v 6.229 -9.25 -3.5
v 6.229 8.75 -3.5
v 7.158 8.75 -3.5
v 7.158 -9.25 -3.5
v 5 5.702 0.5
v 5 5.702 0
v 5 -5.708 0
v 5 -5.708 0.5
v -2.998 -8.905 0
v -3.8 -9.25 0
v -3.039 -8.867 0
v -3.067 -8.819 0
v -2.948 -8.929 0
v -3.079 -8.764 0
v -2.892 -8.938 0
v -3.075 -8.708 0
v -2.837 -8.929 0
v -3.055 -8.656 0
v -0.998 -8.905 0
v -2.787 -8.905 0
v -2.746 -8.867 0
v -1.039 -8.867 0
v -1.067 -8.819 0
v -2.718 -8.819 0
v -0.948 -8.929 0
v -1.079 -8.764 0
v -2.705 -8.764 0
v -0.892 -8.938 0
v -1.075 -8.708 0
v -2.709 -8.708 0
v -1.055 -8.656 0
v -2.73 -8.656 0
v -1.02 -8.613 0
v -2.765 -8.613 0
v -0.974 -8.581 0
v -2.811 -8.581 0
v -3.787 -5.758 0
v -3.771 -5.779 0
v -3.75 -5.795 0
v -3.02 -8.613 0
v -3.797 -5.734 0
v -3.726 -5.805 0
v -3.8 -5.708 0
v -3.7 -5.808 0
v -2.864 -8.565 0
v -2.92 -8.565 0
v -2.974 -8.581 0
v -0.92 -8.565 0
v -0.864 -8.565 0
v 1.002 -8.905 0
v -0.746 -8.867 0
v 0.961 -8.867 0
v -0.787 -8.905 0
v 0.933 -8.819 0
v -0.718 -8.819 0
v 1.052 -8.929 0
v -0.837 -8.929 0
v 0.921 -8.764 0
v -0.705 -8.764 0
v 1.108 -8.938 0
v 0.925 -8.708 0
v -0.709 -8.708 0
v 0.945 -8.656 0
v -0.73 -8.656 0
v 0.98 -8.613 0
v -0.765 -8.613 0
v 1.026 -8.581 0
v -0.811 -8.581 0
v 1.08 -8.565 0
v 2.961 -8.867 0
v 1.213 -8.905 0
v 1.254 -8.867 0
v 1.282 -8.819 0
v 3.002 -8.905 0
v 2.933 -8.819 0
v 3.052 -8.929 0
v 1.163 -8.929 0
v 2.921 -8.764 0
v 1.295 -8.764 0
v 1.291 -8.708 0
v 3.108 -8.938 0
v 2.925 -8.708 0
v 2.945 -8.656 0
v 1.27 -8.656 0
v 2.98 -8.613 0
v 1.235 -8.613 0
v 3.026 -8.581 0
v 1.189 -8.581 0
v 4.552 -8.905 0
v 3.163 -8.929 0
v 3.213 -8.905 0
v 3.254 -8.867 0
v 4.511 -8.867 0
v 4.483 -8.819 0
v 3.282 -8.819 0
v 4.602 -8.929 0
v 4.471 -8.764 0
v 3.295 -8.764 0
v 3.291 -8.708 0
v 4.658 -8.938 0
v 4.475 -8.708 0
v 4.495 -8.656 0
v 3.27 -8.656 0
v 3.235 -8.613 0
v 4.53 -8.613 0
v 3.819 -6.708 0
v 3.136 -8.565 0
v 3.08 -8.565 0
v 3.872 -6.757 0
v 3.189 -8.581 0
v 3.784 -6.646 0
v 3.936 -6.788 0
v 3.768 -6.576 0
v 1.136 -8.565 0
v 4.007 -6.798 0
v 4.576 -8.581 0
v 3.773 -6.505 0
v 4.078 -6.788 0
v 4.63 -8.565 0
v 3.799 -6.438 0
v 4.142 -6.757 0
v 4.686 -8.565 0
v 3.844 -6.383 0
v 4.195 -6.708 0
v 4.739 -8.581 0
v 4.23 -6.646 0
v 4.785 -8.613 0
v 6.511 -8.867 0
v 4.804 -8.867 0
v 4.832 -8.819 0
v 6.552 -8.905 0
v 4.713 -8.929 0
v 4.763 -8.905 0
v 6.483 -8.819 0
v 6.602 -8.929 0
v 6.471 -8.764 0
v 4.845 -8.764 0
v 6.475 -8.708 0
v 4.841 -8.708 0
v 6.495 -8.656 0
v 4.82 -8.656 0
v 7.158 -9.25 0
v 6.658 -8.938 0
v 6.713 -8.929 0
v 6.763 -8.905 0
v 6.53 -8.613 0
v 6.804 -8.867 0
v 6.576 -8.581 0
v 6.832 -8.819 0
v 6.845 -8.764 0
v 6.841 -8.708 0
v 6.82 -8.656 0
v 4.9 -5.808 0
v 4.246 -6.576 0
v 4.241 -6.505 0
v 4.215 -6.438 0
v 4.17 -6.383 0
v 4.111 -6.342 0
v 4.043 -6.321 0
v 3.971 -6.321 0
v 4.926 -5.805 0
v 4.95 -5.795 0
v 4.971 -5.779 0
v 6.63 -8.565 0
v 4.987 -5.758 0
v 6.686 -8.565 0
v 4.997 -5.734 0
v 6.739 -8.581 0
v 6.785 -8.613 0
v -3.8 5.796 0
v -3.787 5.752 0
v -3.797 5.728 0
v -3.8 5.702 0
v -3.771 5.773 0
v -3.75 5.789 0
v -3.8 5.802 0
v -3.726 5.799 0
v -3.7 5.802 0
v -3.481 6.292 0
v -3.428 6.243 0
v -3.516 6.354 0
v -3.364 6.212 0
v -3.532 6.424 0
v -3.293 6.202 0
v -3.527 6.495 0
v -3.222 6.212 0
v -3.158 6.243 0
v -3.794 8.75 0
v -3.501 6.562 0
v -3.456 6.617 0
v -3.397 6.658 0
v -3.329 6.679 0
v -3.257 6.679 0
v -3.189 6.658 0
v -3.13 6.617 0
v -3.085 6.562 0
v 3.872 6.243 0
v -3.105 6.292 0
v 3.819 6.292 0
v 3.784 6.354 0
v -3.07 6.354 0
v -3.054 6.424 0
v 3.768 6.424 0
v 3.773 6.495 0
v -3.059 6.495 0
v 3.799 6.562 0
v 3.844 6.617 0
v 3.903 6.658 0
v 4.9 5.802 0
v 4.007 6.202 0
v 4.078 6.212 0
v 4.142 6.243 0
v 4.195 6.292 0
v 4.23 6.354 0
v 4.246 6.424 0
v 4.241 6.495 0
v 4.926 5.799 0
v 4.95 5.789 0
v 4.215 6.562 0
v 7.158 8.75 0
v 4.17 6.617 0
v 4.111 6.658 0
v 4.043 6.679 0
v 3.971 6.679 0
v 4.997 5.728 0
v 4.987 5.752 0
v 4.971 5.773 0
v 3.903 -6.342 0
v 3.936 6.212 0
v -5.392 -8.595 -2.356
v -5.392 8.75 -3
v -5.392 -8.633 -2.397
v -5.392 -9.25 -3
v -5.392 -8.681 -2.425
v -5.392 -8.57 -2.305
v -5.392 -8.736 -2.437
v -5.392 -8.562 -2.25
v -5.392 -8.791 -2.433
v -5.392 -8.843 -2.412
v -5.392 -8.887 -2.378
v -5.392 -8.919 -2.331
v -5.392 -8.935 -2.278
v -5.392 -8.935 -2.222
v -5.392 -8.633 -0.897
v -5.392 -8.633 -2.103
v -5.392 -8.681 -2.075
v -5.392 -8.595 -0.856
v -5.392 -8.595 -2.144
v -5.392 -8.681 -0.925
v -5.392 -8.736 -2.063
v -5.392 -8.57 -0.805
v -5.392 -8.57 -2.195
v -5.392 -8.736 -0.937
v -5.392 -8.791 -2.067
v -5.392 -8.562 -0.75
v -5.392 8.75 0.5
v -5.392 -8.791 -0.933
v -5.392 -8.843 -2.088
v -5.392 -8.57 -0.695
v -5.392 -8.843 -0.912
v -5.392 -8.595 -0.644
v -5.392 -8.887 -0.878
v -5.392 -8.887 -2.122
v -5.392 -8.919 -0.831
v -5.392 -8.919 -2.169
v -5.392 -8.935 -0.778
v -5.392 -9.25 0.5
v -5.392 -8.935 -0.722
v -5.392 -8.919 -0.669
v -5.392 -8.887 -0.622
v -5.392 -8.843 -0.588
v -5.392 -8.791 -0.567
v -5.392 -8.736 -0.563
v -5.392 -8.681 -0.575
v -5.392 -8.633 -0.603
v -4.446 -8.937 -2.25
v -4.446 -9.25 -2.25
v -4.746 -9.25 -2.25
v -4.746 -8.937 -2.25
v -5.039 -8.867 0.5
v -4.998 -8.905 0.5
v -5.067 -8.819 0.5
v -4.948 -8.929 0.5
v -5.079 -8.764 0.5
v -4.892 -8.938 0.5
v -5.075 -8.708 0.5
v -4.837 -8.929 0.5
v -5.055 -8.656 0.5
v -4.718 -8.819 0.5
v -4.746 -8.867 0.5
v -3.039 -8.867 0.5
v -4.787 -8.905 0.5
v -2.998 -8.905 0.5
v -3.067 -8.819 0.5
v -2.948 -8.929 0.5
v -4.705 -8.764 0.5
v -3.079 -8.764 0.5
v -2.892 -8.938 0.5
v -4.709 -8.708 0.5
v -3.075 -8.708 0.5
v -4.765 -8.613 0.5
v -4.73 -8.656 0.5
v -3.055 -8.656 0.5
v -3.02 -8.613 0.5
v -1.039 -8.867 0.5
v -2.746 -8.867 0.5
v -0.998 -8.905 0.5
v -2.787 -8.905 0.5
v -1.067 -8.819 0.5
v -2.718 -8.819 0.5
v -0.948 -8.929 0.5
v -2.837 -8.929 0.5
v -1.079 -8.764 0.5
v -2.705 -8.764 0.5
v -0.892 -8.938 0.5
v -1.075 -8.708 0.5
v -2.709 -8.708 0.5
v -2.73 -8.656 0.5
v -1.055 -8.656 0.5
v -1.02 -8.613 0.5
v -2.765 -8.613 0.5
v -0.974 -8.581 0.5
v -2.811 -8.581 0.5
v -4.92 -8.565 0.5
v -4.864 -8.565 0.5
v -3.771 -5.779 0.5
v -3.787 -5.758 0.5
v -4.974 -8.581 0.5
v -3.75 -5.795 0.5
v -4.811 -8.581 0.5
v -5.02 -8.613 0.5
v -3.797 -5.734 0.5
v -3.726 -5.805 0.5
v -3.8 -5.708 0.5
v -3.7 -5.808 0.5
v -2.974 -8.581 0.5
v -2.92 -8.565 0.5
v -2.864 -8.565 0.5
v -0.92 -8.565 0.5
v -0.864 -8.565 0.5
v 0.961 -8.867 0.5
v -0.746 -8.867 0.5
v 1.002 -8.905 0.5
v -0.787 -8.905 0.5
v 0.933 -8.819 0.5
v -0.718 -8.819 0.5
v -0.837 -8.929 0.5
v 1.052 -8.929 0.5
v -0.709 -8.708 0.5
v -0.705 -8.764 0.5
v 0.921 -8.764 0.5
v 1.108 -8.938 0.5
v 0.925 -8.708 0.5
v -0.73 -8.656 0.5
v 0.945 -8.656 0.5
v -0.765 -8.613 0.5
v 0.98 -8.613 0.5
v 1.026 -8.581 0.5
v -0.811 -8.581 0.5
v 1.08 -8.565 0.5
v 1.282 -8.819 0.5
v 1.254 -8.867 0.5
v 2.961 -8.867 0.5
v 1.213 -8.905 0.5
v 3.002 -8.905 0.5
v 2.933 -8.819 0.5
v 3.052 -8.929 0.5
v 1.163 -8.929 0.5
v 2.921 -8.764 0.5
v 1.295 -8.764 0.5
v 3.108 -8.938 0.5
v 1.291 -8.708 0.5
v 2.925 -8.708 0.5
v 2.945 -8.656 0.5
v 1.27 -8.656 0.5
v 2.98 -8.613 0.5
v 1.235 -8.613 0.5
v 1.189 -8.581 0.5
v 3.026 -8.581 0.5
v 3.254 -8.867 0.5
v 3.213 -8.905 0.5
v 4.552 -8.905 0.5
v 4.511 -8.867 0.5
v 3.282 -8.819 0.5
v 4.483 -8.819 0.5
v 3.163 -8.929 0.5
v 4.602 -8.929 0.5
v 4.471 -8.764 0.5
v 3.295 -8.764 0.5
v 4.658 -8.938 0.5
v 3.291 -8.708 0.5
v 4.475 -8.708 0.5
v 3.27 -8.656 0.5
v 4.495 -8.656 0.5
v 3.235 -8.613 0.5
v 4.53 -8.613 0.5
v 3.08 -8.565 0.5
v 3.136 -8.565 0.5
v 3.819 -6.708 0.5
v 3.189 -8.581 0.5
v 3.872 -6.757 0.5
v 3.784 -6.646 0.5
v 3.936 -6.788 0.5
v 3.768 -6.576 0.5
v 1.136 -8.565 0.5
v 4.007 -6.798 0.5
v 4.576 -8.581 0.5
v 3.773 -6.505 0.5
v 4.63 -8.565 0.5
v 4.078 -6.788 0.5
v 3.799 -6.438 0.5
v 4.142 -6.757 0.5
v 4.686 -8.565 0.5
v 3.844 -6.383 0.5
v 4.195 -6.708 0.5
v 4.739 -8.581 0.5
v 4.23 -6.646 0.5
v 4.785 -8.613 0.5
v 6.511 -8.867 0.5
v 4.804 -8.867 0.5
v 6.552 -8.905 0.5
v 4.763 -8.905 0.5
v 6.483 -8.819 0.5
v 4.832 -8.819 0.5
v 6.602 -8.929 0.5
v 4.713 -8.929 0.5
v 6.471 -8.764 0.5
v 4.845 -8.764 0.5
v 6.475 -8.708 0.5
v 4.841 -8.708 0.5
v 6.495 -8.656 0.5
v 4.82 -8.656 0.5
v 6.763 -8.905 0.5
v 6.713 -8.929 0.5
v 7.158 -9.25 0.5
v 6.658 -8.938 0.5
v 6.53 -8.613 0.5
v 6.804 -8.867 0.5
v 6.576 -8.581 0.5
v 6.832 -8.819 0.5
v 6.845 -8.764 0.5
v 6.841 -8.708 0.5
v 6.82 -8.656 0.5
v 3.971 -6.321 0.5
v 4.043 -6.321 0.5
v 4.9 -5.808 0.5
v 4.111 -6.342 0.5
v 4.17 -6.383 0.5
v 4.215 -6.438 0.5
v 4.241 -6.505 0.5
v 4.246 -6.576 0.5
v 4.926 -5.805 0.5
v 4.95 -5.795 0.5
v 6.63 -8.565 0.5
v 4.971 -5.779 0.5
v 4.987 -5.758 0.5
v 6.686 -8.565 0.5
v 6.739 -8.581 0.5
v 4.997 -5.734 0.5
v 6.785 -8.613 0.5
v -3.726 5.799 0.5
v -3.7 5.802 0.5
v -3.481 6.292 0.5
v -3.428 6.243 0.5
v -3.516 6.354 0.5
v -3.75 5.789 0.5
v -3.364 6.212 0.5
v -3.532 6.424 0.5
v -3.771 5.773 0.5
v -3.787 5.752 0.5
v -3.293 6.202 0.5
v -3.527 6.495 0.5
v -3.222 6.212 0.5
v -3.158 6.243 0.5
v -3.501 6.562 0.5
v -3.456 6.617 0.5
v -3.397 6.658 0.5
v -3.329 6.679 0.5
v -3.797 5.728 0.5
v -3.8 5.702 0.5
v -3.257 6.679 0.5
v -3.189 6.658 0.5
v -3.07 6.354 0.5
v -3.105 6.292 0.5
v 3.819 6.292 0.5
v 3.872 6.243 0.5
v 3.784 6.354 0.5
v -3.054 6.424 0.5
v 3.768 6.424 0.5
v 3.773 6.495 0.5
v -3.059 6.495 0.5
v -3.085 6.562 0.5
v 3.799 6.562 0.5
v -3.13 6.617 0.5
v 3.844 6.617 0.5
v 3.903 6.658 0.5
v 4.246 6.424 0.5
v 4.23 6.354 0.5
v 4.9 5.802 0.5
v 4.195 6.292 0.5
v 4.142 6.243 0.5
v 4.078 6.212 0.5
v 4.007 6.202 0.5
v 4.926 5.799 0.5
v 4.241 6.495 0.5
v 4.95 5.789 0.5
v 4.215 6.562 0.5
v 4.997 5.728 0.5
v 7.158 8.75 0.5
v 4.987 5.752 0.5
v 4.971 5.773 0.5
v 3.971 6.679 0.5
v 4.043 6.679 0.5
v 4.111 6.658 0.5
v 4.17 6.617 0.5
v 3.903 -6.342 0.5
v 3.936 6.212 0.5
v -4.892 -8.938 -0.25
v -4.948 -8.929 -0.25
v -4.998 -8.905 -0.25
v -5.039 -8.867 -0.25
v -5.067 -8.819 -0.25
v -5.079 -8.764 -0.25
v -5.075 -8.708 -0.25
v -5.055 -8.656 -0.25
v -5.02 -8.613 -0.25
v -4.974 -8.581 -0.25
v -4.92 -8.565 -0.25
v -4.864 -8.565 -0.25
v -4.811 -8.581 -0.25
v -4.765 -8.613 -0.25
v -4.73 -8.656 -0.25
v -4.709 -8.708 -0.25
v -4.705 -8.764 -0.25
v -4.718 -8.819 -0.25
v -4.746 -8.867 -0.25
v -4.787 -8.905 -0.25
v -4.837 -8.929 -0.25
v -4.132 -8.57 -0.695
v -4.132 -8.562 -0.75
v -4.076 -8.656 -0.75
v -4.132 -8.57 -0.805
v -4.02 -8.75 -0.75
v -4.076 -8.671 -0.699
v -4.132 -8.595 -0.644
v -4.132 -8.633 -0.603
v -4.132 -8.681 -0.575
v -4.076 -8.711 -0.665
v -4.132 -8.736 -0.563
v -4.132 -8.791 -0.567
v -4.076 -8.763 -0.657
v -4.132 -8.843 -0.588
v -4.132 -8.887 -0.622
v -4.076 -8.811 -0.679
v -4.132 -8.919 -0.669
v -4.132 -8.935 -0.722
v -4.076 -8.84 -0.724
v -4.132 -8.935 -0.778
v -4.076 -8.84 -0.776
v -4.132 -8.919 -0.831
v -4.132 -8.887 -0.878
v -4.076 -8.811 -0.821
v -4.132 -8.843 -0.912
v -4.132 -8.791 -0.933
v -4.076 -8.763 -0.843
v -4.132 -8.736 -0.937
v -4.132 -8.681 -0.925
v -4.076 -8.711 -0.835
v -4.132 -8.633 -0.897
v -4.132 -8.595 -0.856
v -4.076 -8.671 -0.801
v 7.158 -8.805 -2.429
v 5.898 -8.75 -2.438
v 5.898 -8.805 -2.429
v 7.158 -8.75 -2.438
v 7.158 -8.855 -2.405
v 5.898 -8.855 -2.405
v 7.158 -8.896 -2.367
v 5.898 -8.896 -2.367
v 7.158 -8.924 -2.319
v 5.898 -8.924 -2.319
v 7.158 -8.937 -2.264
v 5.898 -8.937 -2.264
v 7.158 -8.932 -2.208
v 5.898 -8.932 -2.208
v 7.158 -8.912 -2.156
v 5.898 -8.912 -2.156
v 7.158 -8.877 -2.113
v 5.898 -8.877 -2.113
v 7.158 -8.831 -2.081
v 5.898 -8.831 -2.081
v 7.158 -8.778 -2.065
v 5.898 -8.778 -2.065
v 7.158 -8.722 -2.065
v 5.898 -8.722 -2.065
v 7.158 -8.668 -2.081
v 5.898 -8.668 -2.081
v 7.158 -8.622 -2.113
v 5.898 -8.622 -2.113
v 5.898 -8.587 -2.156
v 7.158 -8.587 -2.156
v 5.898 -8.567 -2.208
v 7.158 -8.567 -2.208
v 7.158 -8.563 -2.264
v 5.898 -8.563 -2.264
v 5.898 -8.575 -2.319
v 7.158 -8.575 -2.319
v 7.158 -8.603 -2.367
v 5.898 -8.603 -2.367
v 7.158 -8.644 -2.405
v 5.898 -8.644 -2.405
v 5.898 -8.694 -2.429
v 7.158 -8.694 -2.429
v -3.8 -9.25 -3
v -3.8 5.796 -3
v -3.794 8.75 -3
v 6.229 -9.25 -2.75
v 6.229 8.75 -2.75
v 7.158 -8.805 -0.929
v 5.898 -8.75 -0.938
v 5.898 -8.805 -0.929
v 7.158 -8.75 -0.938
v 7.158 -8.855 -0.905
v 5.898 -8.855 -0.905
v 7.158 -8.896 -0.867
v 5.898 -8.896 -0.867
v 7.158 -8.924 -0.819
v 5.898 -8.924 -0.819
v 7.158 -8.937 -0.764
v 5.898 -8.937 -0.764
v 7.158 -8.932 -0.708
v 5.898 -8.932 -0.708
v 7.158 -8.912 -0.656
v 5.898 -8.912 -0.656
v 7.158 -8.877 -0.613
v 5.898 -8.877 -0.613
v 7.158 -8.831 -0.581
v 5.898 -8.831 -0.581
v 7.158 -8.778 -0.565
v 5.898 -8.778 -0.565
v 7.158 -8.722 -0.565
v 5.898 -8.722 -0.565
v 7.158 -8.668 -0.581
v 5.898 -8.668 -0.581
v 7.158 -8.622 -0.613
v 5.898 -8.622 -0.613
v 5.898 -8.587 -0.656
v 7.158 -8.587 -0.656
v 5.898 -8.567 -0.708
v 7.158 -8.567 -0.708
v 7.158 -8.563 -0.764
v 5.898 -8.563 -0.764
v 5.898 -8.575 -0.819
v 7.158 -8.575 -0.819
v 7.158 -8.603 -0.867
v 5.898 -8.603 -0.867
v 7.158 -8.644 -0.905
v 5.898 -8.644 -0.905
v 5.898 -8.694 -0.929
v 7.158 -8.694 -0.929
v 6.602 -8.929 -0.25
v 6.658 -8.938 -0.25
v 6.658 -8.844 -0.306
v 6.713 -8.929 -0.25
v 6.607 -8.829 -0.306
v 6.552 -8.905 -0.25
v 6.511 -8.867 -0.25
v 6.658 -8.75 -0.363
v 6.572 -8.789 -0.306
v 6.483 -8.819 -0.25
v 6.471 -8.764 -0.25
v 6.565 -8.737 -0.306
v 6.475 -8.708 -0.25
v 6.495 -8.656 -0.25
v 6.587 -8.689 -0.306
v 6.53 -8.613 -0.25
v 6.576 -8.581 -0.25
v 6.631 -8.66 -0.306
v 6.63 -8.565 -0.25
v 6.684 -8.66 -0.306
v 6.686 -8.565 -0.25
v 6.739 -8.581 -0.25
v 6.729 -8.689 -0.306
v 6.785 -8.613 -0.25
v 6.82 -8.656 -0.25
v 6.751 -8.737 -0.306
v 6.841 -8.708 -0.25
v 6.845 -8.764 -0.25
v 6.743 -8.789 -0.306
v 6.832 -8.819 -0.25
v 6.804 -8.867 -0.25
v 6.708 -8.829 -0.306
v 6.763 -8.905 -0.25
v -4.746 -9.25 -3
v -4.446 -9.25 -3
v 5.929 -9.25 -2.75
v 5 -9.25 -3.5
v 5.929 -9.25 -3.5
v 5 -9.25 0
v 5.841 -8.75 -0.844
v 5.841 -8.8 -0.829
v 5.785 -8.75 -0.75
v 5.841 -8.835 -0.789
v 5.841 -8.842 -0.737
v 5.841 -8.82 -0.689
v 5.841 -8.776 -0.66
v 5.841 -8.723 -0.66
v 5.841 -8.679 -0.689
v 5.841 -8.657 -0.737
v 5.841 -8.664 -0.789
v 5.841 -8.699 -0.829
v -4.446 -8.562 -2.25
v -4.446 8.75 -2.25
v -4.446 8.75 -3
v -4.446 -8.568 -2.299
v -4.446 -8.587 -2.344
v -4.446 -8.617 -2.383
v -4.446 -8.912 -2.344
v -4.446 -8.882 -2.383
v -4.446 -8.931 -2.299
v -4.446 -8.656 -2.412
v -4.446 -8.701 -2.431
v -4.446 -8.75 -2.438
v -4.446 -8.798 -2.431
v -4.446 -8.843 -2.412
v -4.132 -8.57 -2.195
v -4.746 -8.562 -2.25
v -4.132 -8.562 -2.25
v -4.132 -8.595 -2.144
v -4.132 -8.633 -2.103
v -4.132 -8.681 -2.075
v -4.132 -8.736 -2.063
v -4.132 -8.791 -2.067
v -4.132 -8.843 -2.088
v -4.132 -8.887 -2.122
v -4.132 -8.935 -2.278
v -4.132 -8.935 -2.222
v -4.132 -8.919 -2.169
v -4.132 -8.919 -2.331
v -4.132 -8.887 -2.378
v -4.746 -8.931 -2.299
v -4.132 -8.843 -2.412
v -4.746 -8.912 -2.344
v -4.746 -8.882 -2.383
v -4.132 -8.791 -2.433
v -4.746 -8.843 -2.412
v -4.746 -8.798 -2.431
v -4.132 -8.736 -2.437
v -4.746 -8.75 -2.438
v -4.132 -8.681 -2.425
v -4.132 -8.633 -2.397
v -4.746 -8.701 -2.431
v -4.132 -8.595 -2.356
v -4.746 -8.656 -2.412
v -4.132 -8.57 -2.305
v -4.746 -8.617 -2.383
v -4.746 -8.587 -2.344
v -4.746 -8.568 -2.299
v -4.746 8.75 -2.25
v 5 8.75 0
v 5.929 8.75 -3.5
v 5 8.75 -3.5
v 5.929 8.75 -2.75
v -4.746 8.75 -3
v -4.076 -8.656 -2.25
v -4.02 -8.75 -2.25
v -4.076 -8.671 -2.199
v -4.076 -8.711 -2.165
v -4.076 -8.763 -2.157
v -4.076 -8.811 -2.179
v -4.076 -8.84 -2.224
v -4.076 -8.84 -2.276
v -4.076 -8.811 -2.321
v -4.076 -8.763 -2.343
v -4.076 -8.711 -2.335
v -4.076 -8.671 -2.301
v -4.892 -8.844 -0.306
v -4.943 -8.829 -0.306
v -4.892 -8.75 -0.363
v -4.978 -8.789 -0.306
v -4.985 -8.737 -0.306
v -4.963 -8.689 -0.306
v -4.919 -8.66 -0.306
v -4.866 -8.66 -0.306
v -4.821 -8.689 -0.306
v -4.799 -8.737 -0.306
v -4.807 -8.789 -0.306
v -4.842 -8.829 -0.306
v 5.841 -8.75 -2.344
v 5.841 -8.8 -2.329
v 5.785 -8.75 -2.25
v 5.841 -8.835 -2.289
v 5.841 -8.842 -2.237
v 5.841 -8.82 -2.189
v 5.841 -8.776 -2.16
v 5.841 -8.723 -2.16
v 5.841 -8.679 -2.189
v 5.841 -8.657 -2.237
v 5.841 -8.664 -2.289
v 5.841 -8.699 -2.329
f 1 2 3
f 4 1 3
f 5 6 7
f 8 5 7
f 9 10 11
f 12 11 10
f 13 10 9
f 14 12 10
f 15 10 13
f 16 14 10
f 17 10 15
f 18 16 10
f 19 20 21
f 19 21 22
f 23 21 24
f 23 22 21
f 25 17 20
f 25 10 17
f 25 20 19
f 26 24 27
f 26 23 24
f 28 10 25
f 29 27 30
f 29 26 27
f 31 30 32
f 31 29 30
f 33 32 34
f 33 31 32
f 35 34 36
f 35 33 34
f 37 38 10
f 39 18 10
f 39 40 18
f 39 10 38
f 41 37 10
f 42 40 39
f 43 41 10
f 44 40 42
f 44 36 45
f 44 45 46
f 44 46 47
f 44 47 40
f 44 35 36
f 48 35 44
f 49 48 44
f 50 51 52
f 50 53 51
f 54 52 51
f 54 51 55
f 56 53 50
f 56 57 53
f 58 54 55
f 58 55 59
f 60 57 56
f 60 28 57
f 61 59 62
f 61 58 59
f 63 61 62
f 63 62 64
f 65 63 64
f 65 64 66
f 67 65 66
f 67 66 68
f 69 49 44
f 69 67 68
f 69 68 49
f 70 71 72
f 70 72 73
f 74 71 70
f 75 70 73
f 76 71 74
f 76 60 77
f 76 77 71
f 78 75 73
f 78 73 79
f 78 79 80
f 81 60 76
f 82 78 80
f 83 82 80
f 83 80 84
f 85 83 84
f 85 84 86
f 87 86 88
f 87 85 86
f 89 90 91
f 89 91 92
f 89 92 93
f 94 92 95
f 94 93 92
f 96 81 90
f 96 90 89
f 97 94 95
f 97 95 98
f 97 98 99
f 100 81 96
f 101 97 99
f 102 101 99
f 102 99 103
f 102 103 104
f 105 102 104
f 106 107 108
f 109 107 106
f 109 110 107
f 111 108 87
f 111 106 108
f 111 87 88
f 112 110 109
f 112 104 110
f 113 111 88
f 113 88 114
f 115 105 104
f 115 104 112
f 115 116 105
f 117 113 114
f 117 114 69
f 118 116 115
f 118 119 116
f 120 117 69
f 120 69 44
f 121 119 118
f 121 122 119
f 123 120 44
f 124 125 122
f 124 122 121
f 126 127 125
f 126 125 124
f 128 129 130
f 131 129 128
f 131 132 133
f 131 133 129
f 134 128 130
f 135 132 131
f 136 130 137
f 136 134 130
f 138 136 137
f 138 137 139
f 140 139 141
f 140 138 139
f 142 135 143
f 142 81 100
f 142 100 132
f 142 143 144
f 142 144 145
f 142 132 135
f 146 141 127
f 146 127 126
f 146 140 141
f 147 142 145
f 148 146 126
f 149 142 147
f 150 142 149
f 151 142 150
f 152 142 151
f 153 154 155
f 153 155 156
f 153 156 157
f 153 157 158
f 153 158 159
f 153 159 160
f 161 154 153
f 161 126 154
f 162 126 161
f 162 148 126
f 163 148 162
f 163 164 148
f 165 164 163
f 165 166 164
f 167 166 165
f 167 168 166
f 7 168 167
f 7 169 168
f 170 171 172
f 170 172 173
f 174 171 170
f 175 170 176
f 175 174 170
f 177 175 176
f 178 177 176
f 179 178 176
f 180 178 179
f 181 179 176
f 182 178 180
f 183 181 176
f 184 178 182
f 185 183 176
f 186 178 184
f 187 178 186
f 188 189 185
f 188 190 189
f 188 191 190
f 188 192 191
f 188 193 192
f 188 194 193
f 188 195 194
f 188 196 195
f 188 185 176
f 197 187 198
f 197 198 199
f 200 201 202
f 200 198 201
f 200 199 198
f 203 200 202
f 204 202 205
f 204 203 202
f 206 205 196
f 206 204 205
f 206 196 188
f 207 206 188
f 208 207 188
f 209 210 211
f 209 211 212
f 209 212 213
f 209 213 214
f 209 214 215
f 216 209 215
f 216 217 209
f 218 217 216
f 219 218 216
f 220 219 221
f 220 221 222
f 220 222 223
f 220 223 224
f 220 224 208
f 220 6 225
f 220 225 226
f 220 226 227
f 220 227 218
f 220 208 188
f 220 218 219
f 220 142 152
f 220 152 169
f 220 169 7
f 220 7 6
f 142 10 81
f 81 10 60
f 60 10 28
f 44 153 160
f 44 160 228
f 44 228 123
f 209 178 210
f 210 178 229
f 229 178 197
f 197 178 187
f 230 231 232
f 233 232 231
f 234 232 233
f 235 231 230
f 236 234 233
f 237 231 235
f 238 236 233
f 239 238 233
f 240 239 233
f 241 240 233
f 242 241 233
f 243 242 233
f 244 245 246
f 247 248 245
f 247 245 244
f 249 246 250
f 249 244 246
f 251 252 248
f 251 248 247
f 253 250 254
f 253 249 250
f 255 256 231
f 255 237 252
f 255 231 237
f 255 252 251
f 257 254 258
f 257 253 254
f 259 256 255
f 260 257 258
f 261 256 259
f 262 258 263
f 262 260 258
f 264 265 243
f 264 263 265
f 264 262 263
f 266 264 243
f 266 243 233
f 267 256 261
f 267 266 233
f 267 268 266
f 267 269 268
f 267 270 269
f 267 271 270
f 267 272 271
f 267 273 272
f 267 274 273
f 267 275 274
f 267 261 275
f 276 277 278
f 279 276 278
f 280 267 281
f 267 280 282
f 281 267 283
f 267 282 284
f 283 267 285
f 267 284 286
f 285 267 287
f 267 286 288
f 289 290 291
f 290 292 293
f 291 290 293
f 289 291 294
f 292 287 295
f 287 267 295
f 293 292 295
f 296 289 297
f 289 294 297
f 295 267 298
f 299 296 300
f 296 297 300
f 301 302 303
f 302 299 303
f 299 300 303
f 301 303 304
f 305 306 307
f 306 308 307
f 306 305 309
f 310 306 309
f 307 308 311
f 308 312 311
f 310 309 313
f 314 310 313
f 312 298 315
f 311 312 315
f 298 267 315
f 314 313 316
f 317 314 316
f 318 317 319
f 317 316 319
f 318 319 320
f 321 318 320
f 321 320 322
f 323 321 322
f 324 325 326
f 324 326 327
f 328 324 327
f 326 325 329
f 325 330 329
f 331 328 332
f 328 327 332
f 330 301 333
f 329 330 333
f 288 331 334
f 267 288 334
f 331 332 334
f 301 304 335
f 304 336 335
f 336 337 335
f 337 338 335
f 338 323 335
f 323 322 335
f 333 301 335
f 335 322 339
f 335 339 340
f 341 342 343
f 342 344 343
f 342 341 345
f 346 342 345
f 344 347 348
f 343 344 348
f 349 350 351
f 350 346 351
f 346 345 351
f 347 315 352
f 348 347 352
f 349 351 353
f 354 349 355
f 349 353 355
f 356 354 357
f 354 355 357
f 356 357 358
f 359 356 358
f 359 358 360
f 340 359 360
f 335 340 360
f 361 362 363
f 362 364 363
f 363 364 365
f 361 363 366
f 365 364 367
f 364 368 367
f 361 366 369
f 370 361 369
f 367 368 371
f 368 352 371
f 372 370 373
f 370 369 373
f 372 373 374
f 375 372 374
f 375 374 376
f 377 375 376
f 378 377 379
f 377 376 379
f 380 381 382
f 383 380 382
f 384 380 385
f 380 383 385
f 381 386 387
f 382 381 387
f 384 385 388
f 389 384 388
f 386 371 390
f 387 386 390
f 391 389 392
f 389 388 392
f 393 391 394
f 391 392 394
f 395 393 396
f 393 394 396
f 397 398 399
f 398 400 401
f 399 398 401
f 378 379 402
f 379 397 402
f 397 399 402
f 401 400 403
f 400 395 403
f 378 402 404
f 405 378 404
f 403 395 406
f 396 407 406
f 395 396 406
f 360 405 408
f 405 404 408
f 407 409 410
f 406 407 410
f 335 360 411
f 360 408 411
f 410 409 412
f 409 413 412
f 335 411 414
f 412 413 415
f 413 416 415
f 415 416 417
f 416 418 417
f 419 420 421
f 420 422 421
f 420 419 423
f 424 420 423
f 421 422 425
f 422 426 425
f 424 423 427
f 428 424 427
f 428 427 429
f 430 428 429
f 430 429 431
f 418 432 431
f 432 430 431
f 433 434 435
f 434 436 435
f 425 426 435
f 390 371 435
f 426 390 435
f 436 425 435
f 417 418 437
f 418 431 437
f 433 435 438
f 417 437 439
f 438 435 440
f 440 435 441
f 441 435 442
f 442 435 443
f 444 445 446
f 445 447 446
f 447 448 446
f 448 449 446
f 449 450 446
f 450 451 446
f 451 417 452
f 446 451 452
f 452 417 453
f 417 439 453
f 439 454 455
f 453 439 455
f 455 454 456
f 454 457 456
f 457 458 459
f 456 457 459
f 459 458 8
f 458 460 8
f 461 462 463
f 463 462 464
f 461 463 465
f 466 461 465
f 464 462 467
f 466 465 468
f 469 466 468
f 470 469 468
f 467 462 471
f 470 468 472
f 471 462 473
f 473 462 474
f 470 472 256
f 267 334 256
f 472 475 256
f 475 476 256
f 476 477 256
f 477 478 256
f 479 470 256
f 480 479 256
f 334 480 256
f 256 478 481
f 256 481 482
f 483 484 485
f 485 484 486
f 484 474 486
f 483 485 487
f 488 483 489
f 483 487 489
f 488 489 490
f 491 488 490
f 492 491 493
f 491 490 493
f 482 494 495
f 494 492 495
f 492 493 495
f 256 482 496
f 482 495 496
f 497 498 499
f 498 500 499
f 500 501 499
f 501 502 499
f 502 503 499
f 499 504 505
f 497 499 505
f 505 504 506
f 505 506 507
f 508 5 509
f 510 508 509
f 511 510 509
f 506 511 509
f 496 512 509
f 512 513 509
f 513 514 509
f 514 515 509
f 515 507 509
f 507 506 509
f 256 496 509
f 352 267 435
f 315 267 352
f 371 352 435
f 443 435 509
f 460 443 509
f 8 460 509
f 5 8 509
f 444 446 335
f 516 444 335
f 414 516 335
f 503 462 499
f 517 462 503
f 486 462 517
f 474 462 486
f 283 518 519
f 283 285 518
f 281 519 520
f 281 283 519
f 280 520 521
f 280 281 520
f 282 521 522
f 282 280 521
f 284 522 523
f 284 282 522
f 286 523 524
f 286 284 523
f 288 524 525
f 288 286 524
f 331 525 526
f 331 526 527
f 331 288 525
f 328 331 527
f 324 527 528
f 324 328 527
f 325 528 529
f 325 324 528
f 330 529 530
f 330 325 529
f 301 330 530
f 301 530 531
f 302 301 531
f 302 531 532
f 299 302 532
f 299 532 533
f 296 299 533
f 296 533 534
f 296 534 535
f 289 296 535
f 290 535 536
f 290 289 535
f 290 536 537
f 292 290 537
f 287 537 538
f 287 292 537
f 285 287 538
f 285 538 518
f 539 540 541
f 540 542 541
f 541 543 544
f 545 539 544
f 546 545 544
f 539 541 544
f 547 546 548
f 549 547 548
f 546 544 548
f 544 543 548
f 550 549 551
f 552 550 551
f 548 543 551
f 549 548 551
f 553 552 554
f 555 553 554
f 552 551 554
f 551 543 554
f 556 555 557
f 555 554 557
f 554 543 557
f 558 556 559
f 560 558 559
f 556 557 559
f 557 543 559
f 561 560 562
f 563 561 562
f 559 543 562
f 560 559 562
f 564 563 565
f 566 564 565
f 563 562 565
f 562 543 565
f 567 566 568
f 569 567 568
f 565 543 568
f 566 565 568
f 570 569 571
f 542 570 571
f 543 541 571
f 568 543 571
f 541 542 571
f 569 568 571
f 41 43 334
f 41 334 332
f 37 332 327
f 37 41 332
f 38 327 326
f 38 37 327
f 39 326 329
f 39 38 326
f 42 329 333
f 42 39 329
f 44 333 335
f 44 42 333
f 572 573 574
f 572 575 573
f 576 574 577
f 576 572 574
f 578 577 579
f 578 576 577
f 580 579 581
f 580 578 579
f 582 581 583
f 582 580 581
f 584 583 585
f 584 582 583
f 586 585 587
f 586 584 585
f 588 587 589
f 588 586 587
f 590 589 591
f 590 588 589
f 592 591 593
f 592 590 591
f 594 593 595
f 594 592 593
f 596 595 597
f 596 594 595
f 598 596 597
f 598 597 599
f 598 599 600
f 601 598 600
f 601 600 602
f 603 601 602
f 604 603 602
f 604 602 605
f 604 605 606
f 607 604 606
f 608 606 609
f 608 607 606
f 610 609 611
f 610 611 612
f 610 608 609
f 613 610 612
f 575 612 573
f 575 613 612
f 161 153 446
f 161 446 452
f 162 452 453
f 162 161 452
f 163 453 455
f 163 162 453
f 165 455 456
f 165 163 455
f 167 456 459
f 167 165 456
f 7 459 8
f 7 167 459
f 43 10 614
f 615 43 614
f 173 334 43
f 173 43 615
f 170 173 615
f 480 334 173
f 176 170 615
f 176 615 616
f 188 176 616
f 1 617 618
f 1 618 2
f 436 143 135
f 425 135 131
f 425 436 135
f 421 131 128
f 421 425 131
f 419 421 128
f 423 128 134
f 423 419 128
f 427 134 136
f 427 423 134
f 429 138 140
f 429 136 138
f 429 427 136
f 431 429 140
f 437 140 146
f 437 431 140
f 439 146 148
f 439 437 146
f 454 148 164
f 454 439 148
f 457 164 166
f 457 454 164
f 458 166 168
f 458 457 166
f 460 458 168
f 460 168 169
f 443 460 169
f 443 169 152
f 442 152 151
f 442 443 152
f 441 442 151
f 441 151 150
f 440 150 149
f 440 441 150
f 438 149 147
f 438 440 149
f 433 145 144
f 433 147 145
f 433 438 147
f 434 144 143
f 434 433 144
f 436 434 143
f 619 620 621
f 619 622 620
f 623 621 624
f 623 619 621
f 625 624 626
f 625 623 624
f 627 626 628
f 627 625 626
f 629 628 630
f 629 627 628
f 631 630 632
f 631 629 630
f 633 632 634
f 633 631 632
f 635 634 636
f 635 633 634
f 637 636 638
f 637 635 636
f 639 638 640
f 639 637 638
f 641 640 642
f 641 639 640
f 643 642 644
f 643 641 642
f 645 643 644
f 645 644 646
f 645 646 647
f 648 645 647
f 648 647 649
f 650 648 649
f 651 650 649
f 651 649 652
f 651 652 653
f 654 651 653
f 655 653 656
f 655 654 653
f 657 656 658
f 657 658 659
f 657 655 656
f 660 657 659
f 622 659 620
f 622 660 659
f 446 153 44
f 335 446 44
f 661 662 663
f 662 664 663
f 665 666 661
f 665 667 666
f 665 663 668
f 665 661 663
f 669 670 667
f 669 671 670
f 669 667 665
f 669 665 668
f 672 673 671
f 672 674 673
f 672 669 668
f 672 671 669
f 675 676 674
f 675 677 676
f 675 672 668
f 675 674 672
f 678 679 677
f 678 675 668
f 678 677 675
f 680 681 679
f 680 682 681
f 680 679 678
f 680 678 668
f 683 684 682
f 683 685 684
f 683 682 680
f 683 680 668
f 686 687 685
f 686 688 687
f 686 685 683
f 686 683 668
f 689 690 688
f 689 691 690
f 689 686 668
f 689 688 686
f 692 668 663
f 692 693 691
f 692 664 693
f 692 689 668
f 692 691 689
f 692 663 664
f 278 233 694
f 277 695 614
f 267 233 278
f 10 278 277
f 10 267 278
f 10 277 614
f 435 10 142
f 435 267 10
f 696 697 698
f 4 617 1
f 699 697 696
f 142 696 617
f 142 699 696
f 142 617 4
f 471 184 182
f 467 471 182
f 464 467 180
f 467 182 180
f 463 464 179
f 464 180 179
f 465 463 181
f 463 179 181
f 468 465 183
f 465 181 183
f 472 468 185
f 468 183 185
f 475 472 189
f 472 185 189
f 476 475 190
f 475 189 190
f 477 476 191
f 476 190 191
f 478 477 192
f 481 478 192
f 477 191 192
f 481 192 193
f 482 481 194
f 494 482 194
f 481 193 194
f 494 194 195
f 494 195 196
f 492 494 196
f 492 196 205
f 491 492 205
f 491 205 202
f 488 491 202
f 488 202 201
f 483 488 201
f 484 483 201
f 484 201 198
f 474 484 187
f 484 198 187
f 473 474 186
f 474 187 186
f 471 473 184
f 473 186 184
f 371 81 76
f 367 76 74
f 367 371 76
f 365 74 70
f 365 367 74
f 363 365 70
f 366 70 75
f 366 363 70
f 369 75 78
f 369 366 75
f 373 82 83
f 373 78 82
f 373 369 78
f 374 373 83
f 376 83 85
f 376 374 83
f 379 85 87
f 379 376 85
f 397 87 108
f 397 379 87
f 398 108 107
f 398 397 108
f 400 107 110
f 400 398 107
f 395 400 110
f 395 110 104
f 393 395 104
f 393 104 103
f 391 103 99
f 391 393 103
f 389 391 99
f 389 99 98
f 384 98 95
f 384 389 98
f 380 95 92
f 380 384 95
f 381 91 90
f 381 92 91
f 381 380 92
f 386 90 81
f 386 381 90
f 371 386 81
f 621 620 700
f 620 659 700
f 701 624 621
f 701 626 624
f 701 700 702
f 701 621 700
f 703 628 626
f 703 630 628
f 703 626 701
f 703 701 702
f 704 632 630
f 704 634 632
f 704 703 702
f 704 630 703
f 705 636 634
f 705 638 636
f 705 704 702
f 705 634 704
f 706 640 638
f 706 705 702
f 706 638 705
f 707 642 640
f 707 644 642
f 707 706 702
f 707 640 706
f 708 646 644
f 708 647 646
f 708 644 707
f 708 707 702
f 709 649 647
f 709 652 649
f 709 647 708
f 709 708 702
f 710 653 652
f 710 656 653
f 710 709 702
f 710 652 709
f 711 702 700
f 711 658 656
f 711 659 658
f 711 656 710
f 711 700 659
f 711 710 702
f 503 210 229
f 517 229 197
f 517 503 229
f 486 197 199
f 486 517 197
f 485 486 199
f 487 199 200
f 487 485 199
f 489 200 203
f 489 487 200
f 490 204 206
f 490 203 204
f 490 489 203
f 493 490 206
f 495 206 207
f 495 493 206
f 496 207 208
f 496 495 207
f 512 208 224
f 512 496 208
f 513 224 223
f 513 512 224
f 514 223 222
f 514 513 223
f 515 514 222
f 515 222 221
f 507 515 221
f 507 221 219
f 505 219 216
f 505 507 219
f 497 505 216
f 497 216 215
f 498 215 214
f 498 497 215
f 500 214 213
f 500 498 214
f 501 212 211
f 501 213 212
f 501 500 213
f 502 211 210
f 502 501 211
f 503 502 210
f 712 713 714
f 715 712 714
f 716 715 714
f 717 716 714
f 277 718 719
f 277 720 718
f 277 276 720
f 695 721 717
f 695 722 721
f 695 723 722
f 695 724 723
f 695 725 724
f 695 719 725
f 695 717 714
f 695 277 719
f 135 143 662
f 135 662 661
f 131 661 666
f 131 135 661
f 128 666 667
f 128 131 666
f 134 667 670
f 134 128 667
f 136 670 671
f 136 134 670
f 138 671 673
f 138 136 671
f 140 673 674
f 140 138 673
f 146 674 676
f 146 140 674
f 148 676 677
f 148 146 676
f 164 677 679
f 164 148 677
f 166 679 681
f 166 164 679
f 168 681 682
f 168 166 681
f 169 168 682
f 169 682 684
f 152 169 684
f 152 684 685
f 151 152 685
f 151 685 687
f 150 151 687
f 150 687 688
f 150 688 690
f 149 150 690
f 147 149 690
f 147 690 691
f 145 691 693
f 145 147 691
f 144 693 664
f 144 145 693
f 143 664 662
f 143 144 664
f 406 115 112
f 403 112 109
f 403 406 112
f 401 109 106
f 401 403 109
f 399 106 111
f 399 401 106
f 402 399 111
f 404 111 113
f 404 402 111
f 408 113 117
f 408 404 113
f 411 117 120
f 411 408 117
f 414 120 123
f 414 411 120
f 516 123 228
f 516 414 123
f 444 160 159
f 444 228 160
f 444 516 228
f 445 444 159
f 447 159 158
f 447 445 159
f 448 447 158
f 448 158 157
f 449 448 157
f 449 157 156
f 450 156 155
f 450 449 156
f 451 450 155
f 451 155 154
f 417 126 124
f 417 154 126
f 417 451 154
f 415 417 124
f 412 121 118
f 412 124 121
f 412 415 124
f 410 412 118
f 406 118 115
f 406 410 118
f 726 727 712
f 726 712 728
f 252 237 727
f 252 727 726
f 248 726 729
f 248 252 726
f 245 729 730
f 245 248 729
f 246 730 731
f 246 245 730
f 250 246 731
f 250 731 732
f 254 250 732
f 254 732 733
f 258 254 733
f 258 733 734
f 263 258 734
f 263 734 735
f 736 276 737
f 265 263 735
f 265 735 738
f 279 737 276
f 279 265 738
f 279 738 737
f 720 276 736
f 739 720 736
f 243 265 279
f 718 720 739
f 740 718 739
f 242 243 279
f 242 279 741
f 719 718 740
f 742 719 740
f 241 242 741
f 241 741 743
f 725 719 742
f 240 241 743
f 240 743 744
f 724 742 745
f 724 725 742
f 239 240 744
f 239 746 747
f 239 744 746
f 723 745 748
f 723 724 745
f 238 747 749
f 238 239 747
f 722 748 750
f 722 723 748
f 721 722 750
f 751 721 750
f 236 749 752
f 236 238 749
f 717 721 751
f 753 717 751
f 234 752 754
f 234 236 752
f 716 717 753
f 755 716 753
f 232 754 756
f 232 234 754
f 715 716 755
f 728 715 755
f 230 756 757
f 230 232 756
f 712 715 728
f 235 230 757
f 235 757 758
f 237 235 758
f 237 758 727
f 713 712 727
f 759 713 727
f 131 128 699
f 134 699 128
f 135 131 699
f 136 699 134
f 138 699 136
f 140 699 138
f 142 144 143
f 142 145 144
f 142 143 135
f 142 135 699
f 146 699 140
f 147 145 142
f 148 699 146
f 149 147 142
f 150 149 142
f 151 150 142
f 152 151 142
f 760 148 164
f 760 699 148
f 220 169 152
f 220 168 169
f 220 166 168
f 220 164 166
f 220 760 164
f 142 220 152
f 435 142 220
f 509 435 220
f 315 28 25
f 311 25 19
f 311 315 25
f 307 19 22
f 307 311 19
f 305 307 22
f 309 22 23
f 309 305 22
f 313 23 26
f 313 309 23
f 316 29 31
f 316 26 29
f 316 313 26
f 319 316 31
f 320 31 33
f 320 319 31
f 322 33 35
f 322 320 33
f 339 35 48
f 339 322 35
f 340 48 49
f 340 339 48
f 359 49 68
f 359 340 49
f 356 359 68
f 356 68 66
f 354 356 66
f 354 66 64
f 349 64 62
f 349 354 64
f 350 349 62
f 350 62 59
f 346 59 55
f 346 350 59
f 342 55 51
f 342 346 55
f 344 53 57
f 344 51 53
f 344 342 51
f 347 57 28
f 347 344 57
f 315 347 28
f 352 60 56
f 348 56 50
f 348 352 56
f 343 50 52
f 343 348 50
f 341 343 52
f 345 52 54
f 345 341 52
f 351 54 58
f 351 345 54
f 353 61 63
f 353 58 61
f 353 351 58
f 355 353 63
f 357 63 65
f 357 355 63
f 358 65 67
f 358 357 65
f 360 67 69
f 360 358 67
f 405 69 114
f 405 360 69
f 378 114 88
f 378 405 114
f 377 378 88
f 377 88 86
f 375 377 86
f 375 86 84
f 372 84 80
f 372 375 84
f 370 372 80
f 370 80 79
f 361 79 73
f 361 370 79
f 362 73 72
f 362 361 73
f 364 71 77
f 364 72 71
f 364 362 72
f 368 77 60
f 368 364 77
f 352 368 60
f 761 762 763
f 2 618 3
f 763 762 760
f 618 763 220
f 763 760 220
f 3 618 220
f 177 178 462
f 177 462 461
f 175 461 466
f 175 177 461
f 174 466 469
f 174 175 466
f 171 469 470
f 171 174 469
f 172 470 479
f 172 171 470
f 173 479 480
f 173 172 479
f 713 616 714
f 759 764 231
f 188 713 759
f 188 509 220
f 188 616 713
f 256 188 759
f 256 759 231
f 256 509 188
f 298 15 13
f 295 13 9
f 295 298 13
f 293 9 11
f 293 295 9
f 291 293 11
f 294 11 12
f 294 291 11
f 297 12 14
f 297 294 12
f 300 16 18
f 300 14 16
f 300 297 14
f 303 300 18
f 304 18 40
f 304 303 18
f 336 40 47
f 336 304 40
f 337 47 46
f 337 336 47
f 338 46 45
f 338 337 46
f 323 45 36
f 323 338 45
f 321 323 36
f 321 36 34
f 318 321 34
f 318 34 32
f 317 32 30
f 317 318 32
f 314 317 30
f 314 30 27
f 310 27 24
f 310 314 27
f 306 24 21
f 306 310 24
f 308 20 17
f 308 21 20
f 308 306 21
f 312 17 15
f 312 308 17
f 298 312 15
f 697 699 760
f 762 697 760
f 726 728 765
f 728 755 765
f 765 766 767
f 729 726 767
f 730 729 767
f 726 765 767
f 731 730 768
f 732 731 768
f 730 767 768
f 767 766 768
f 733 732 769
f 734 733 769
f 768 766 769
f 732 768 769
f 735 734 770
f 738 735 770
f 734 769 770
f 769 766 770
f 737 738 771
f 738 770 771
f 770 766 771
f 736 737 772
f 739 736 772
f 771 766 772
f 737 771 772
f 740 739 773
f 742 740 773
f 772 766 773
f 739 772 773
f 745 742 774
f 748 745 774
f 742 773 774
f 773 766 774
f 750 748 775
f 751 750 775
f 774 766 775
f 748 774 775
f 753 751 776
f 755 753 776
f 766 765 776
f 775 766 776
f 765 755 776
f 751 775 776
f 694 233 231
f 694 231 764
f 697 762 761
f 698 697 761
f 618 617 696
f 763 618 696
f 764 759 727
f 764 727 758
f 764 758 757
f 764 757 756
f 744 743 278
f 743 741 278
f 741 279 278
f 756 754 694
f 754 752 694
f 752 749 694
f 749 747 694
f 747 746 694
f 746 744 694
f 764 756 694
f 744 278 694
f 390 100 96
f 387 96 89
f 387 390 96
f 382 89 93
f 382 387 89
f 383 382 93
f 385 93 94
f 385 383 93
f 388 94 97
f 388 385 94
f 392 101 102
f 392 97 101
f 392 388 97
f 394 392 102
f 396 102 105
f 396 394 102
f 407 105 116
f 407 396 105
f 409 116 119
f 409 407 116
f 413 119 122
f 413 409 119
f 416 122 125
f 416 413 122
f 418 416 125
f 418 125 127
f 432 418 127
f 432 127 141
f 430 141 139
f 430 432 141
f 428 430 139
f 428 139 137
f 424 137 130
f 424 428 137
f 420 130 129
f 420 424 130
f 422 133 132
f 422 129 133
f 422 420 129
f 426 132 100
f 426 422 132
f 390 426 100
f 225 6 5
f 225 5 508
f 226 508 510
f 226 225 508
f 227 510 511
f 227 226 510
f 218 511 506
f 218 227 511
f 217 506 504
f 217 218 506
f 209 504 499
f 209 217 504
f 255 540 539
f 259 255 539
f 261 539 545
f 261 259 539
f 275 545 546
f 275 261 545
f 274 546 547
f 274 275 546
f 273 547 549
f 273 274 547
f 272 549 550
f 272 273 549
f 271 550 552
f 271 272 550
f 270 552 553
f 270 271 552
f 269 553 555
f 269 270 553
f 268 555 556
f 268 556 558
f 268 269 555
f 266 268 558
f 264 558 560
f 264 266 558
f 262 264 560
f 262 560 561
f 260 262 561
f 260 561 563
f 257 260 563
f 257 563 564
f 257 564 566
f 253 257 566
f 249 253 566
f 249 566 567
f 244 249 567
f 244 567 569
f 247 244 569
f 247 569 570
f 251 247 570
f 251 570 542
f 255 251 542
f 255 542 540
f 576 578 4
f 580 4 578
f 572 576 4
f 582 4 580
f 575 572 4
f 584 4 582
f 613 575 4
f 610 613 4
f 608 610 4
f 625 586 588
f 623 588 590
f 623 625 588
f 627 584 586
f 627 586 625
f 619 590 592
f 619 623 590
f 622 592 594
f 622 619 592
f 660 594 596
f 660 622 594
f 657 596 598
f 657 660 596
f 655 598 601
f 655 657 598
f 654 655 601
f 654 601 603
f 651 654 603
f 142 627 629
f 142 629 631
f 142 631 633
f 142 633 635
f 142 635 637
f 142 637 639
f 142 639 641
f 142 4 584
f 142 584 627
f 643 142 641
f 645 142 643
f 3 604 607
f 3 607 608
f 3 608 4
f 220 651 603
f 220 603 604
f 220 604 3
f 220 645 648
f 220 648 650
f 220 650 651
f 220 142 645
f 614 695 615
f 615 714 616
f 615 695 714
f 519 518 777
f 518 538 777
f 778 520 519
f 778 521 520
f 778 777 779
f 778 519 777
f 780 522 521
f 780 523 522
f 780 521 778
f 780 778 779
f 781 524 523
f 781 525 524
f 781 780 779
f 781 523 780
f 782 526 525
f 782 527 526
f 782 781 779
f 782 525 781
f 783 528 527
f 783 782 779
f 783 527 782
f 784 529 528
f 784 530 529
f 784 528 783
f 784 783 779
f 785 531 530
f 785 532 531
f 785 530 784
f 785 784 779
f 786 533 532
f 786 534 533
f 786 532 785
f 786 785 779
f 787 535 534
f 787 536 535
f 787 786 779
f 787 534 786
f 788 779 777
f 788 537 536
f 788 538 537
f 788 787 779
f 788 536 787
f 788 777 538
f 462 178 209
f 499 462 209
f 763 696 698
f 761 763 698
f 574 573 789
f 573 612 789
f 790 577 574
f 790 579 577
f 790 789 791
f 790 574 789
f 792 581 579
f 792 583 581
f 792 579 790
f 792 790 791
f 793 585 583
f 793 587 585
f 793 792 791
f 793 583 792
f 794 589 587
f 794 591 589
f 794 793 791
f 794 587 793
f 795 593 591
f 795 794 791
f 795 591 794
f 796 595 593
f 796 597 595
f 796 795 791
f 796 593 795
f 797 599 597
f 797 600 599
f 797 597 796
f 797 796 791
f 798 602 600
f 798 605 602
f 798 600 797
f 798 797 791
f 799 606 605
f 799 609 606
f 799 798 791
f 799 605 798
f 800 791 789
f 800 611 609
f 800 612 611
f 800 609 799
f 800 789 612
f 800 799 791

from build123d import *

# Parameters (mm, degrees)
BOSS_EXTRUDE1_DEPTH                = 0.5
SKETCH4_3_W                        = 2.157759448
SKETCH4_3_H                        = 18
BOSS_EXTRUDE2_DEPTH                = 3.5
BOSS_EXTRUDE3_DEPTH                = 3
FILLET1_R                          = 0.1
SKETCH26_W                         = 0.24
SKETCH26_H                         = 4
SKETCH28_W                         = 0.3
SKETCH28_H                         = 0.75
CUT_EXTRUDE1_DEPTH                 = 18
M0_5X0_125_TAPPED_HOLE1_AT_2_COUNT = 2
M0_5X0_125_TAPPED_HOLE1_AT_2_PITCH = 11.549997101
M0_5X0_125_TAPPED_HOLE1_AT_3_COUNT = 2
M0_5X0_125_TAPPED_HOLE1_AT_3_PITCH = 2
M0_5X0_125_TAPPED_HOLE1_AT_4_COUNT = 2
M0_5X0_125_TAPPED_HOLE1_AT_4_PITCH = 4
M0_5X0_125_TAPPED_HOLE1_AT_5_COUNT = 2
M0_5X0_125_TAPPED_HOLE1_AT_5_PITCH = 6
M0_5X0_125_TAPPED_HOLE1_AT_6_COUNT = 2
M0_5X0_125_TAPPED_HOLE1_AT_6_PITCH = 8
M0_5X0_125_TAPPED_HOLE1_AT_7_COUNT = 2
M0_5X0_125_TAPPED_HOLE1_AT_7_PITCH = 9.549997101
M0_5X0_125_TAPPED_HOLE2_AT_2_COUNT = 2
M0_5X0_125_TAPPED_HOLE2_AT_2_PITCH = 1.5
MIRROR9_START                      = -6
MIRROR9_OUTLINE_R                  = 0.1875
MIRROR9_DEPTH                      = 1.867813005


with BuildPart() as part:
    # Sketch4 → Boss-Extrude1 (new body)
    with BuildSketch(Plane(origin=(5.549975664, -0.767698462, 0), x_dir=(1, 0, 0), z_dir=(0, 0, 1))):
        Polygon((-10.942216218, -8.482301538), (1.607783784, -8.482301538), (1.607783784, 9.517698462), (-10.942111801, 9.517698462), align=None)
        Polygon((-0.549975664, -5.040773631), (-9.349975664, -5.040773631), (-9.349975664, 6.563333727), (-9.349962677, 6.569879134), (-0.549975664, 6.569879134), align=None, mode=Mode.SUBTRACT)
    extrude(amount=BOSS_EXTRUDE1_DEPTH)

    # Sketch4<5> → Boss-Extrude3 (add)
    with BuildSketch(Plane(origin=(5.549975664, -0.767698462, 0), x_dir=(1, 0, 0), z_dir=(0, 0, 1))):
        Polygon((-10.942216218, -8.482301538), (-9.349975664, -8.482301538), (-9.349975664, 6.563333727), (-9.34411366, 9.517698462), (-10.942111801, 9.517698462), align=None)
    extrude(amount=-BOSS_EXTRUDE3_DEPTH)

    # Fillet1
    # the kernel refuses this fillet: 0.1 mm, written as the material it adds along each edge
    with BuildSketch(Plane(origin=(-3.8, -5.808472093, 0), x_dir=(1, 0, 0), z_dir=(0, 0, 1)), Plane(origin=(5, -5.808472093, 0), x_dir=(0, 1, 0), z_dir=(0, 0, 1)), Plane(origin=(5, 5.802180672, 0), x_dir=(-1, 0, 0), z_dir=(0, 0, 1))) as fillet1_piece_1:
        with BuildLine():
            CenterArc((FILLET1_R, FILLET1_R), FILLET1_R, 180, 90)
            Line((0, FILLET1_R), (0, 0))
            Line((0, 0), (FILLET1_R, 0))
        make_face()
    extrude(amount=0.5)
    with BuildSketch(Plane(origin=(-3.799987013, 5.802180672, 0), x_dir=(-0.0001298729448490843, -0.9999999915665091, 0), z_dir=(0, 0, 1))) as fillet1_piece_2:
        with BuildLine():
            CenterArc((0.099987014, 0.099999999), FILLET1_R, 180.007441172, 90)
            Line((-1.2986e-05, 0.099987012), (-0.010012986, 0.099985713))
            Line((-0.010012986, 0.099985713), (-0.01, -1.299e-06))
            Line((-0.01, -1.299e-06), (-1.8543e-05, -0.009999983))
            ThreePointArc((-1.8543e-05, -0.009999983), (0.006546707, -0.010012137), (0.1000013, -0.01))
            Line((0.1000013, -0.01), (0.100000001, 0))
        make_face()
    extrude(amount=0.5)

    # Sketch26 → M0.6x0.15 Tapped Hole - pcb mount (revolve, cut)
    with BuildSketch(Plane(origin=(-3.293086815, 6.441527579, 0.5), x_dir=(0, -1, 0), z_dir=(1, 0, 0))):
        with Locations((0.12, 2)):
            Rectangle(SKETCH26_W, SKETCH26_H)
    revolve(axis=Axis((-3.293086815, 6.441527579, 6.85), (0, 0, -1)), mode=Mode.SUBTRACT)


with BuildPart() as body_2:
    # Sketch4<3> → Boss-Extrude2 (new body)
    with BuildSketch(Plane(origin=(5.549975664, -0.767698462, 0), x_dir=(1, 0, 0), z_dir=(0, 0, 1))):
        with Locations((0.52890406, 0.517698462)):
            Rectangle(SKETCH4_3_W, SKETCH4_3_H)
    extrude(amount=-BOSS_EXTRUDE2_DEPTH)


with BuildPart() as cut_extrude1_tool:
    # Sketch28 → Cut-Extrude1 (new body)
    with BuildSketch(Plane(origin=(0, -9.25, 0), x_dir=(-1, 0, 0), z_dir=(0, -1, 0))):
        with Locations((4.596120277, 2.625)):
            Rectangle(SKETCH28_W, SKETCH28_H)
        with Locations((-6.078879724, 3.125)):
            Rectangle(SKETCH28_W, SKETCH28_H)
    extrude(amount=-CUT_EXTRUDE1_DEPTH)


with BuildPart() as part_1:
    add(part.part)

    # Cut-Extrude1: cut by cut_extrude1_tool
    add(cut_extrude1_tool.part, mode=Mode.SUBTRACT)

    # Sketch30 → M0.5x0.125 Tapped Hole1 (revolve, cut)
    with BuildSketch(Plane(origin=(-4.892237653, -8.75, 0.5), x_dir=(0, -1, 0), z_dir=(1, 0, 0))):
        Polygon((0, 0), (0, 0.862661366), (0.1875, 0.75), (0.1875, 0), align=None)
    m0_5x0_125_tapped_hole1 = revolve(axis=Axis((-4.892237653, -8.75, 6.85), (0, 0, -1)), mode=Mode.SUBTRACT)


with BuildPart() as body_2_1:
    add(body_2.part)

    # Cut-Extrude1: cut by cut_extrude1_tool
    add(cut_extrude1_tool.part, mode=Mode.SUBTRACT)


with BuildPart() as m0_5x0_125_tapped_hole1_at_2_tool:
    # M0.5x0.125 Tapped Hole1 at 2: M0.5x0.125 Tapped Hole1 ×2
    with Locations(*[(i * M0_5X0_125_TAPPED_HOLE1_AT_2_PITCH, 0, 0) for i in range(1, M0_5X0_125_TAPPED_HOLE1_AT_2_COUNT)]):
        add(m0_5x0_125_tapped_hole1)


with BuildPart() as part_2:
    add(part_1.part)

    # M0.5x0.125 Tapped Hole1 at 2: cut by m0_5x0_125_tapped_hole1_at_2_tool
    add(m0_5x0_125_tapped_hole1_at_2_tool.part, mode=Mode.SUBTRACT)

    # M0.5x0.125 Tapped Hole1 at 3: M0.5x0.125 Tapped Hole1 ×2
    with Locations(*[(i * M0_5X0_125_TAPPED_HOLE1_AT_3_PITCH, 0, 0) for i in range(1, M0_5X0_125_TAPPED_HOLE1_AT_3_COUNT)]):
        add(m0_5x0_125_tapped_hole1, mode=Mode.SUBTRACT)

    # M0.5x0.125 Tapped Hole1 at 4: M0.5x0.125 Tapped Hole1 ×2
    with Locations(*[(i * M0_5X0_125_TAPPED_HOLE1_AT_4_PITCH, 0, 0) for i in range(1, M0_5X0_125_TAPPED_HOLE1_AT_4_COUNT)]):
        add(m0_5x0_125_tapped_hole1, mode=Mode.SUBTRACT)

    # M0.5x0.125 Tapped Hole1 at 5: M0.5x0.125 Tapped Hole1 ×2
    with Locations(*[(i * M0_5X0_125_TAPPED_HOLE1_AT_5_PITCH, 0, 0) for i in range(1, M0_5X0_125_TAPPED_HOLE1_AT_5_COUNT)]):
        add(m0_5x0_125_tapped_hole1, mode=Mode.SUBTRACT)

    # M0.5x0.125 Tapped Hole1 at 6: M0.5x0.125 Tapped Hole1 ×2
    with Locations(*[(i * M0_5X0_125_TAPPED_HOLE1_AT_6_PITCH, 0, 0) for i in range(1, M0_5X0_125_TAPPED_HOLE1_AT_6_COUNT)]):
        add(m0_5x0_125_tapped_hole1, mode=Mode.SUBTRACT)

    # M0.5x0.125 Tapped Hole1 at 7: M0.5x0.125 Tapped Hole1 ×2
    with Locations(*[(i * M0_5X0_125_TAPPED_HOLE1_AT_7_PITCH, 0, 0) for i in range(1, M0_5X0_125_TAPPED_HOLE1_AT_7_COUNT)]):
        add(m0_5x0_125_tapped_hole1, mode=Mode.SUBTRACT)

    # Mirror9: read off the stored shape, not the designer's step
    # Mirror9 outline → Mirror9 (cut)
    with BuildSketch(Plane(origin=(0, 0, 0), x_dir=(5.800925593088129e-06, 0.9999999999831747, 0), z_dir=(0.9999999999831748, -5.8009255930881285e-06, 0)).offset(MIRROR9_START)):
        with Locations((-8.749630019, -0.75)):
            Circle(MIRROR9_OUTLINE_R)
        with Locations((-8.749630019, -2.25)):
            Circle(MIRROR9_OUTLINE_R)
    extrude(amount=MIRROR9_DEPTH, mode=Mode.SUBTRACT)

    # Mirror9 2 outline → Mirror9 2 (revolve, cut)
    with BuildSketch(Plane(origin=(-5.0756e-05, -8.749630019, -0.75), x_dir=(5.800925593088129e-06, 0.9999999999831747, 0), z_dir=(0, 0, -1))):
        Polygon((0.1875, -4.132186895), (0, -4.019525529), (0, -4.132186995), align=None)
    revolve(axis=Axis((-5.0756e-05, -8.749630019, -0.75), (0.9999999999831749, -5.800925593088131e-06, 0)), mode=Mode.SUBTRACT)

    # Mirror9 3 outline → Mirror9 3 (revolve, cut)
    with BuildSketch(Plane(origin=(-5.0756e-05, -8.749630019, -2.25), x_dir=(5.800925593088129e-06, 0.9999999999831747, 0), z_dir=(0, 0, -1))):
        Polygon((0.1875, -4.132186895), (0, -4.019525529), (0, -4.132186995), align=None)
    revolve(axis=Axis((-5.0756e-05, -8.749630019, -2.25), (0.9999999999831749, -5.800925593088131e-06, 0)), mode=Mode.SUBTRACT)

    # Sketch45 → M0.6x0.15 Tapped Hole1 (revolve, cut)
    with BuildSketch(Plane(origin=(4.006913198, 6.441527579, 0.5), x_dir=(0, -1, 0), z_dir=(1, 0, 0))):
        Polygon((0, 0), (0, 1.144206549), (0.24, 1), (0.24, 0), align=None)
    revolve(axis=Axis((4.006913198, 6.441527579, 6.85), (0, 0, -1)), mode=Mode.SUBTRACT)

    # Sketch50 → M0.6x0.15 Tapped Hole2 (revolve, cut)
    with BuildSketch(Plane(origin=(4.006913151, -6.558470788, 0.5), x_dir=(0, -1, 0), z_dir=(1, 0, 0))):
        Polygon((0, 0), (0, 1.794206549), (0.24, 1.65), (0.24, 0), align=None)
    revolve(axis=Axis((4.006913151, -6.558470788, 6.85), (0, 0, -1)), mode=Mode.SUBTRACT)


with BuildPart() as body_2_2:
    add(body_2_1.part)

    # M0.5x0.125 Tapped Hole1 at 2: cut by m0_5x0_125_tapped_hole1_at_2_tool
    add(m0_5x0_125_tapped_hole1_at_2_tool.part, mode=Mode.SUBTRACT)

    # Sketch32 → M0.5x0.125 Tapped Hole2 (revolve, cut)
    with BuildSketch(Plane(origin=(7.157759448, -8.74963514, -0.75), x_dir=(0, 0, -1), z_dir=(0, 1, 0))):
        Polygon((0, 0), (0, 1.372661366), (0.1875, 1.26), (0.1875, 0), align=None)
    m0_5x0_125_tapped_hole2 = revolve(axis=Axis((13.507759448, -8.74963514, -0.75), (-1, 0, 0)), mode=Mode.SUBTRACT)

    # M0.5x0.125 Tapped Hole2 at 2: M0.5x0.125 Tapped Hole2 ×2
    with Locations(*[(0, 0, -i * M0_5X0_125_TAPPED_HOLE2_AT_2_PITCH) for i in range(1, M0_5X0_125_TAPPED_HOLE2_AT_2_COUNT)]):
        add(m0_5x0_125_tapped_hole2, mode=Mode.SUBTRACT)


solid = Compound([part_2.part, body_2_2.part])
